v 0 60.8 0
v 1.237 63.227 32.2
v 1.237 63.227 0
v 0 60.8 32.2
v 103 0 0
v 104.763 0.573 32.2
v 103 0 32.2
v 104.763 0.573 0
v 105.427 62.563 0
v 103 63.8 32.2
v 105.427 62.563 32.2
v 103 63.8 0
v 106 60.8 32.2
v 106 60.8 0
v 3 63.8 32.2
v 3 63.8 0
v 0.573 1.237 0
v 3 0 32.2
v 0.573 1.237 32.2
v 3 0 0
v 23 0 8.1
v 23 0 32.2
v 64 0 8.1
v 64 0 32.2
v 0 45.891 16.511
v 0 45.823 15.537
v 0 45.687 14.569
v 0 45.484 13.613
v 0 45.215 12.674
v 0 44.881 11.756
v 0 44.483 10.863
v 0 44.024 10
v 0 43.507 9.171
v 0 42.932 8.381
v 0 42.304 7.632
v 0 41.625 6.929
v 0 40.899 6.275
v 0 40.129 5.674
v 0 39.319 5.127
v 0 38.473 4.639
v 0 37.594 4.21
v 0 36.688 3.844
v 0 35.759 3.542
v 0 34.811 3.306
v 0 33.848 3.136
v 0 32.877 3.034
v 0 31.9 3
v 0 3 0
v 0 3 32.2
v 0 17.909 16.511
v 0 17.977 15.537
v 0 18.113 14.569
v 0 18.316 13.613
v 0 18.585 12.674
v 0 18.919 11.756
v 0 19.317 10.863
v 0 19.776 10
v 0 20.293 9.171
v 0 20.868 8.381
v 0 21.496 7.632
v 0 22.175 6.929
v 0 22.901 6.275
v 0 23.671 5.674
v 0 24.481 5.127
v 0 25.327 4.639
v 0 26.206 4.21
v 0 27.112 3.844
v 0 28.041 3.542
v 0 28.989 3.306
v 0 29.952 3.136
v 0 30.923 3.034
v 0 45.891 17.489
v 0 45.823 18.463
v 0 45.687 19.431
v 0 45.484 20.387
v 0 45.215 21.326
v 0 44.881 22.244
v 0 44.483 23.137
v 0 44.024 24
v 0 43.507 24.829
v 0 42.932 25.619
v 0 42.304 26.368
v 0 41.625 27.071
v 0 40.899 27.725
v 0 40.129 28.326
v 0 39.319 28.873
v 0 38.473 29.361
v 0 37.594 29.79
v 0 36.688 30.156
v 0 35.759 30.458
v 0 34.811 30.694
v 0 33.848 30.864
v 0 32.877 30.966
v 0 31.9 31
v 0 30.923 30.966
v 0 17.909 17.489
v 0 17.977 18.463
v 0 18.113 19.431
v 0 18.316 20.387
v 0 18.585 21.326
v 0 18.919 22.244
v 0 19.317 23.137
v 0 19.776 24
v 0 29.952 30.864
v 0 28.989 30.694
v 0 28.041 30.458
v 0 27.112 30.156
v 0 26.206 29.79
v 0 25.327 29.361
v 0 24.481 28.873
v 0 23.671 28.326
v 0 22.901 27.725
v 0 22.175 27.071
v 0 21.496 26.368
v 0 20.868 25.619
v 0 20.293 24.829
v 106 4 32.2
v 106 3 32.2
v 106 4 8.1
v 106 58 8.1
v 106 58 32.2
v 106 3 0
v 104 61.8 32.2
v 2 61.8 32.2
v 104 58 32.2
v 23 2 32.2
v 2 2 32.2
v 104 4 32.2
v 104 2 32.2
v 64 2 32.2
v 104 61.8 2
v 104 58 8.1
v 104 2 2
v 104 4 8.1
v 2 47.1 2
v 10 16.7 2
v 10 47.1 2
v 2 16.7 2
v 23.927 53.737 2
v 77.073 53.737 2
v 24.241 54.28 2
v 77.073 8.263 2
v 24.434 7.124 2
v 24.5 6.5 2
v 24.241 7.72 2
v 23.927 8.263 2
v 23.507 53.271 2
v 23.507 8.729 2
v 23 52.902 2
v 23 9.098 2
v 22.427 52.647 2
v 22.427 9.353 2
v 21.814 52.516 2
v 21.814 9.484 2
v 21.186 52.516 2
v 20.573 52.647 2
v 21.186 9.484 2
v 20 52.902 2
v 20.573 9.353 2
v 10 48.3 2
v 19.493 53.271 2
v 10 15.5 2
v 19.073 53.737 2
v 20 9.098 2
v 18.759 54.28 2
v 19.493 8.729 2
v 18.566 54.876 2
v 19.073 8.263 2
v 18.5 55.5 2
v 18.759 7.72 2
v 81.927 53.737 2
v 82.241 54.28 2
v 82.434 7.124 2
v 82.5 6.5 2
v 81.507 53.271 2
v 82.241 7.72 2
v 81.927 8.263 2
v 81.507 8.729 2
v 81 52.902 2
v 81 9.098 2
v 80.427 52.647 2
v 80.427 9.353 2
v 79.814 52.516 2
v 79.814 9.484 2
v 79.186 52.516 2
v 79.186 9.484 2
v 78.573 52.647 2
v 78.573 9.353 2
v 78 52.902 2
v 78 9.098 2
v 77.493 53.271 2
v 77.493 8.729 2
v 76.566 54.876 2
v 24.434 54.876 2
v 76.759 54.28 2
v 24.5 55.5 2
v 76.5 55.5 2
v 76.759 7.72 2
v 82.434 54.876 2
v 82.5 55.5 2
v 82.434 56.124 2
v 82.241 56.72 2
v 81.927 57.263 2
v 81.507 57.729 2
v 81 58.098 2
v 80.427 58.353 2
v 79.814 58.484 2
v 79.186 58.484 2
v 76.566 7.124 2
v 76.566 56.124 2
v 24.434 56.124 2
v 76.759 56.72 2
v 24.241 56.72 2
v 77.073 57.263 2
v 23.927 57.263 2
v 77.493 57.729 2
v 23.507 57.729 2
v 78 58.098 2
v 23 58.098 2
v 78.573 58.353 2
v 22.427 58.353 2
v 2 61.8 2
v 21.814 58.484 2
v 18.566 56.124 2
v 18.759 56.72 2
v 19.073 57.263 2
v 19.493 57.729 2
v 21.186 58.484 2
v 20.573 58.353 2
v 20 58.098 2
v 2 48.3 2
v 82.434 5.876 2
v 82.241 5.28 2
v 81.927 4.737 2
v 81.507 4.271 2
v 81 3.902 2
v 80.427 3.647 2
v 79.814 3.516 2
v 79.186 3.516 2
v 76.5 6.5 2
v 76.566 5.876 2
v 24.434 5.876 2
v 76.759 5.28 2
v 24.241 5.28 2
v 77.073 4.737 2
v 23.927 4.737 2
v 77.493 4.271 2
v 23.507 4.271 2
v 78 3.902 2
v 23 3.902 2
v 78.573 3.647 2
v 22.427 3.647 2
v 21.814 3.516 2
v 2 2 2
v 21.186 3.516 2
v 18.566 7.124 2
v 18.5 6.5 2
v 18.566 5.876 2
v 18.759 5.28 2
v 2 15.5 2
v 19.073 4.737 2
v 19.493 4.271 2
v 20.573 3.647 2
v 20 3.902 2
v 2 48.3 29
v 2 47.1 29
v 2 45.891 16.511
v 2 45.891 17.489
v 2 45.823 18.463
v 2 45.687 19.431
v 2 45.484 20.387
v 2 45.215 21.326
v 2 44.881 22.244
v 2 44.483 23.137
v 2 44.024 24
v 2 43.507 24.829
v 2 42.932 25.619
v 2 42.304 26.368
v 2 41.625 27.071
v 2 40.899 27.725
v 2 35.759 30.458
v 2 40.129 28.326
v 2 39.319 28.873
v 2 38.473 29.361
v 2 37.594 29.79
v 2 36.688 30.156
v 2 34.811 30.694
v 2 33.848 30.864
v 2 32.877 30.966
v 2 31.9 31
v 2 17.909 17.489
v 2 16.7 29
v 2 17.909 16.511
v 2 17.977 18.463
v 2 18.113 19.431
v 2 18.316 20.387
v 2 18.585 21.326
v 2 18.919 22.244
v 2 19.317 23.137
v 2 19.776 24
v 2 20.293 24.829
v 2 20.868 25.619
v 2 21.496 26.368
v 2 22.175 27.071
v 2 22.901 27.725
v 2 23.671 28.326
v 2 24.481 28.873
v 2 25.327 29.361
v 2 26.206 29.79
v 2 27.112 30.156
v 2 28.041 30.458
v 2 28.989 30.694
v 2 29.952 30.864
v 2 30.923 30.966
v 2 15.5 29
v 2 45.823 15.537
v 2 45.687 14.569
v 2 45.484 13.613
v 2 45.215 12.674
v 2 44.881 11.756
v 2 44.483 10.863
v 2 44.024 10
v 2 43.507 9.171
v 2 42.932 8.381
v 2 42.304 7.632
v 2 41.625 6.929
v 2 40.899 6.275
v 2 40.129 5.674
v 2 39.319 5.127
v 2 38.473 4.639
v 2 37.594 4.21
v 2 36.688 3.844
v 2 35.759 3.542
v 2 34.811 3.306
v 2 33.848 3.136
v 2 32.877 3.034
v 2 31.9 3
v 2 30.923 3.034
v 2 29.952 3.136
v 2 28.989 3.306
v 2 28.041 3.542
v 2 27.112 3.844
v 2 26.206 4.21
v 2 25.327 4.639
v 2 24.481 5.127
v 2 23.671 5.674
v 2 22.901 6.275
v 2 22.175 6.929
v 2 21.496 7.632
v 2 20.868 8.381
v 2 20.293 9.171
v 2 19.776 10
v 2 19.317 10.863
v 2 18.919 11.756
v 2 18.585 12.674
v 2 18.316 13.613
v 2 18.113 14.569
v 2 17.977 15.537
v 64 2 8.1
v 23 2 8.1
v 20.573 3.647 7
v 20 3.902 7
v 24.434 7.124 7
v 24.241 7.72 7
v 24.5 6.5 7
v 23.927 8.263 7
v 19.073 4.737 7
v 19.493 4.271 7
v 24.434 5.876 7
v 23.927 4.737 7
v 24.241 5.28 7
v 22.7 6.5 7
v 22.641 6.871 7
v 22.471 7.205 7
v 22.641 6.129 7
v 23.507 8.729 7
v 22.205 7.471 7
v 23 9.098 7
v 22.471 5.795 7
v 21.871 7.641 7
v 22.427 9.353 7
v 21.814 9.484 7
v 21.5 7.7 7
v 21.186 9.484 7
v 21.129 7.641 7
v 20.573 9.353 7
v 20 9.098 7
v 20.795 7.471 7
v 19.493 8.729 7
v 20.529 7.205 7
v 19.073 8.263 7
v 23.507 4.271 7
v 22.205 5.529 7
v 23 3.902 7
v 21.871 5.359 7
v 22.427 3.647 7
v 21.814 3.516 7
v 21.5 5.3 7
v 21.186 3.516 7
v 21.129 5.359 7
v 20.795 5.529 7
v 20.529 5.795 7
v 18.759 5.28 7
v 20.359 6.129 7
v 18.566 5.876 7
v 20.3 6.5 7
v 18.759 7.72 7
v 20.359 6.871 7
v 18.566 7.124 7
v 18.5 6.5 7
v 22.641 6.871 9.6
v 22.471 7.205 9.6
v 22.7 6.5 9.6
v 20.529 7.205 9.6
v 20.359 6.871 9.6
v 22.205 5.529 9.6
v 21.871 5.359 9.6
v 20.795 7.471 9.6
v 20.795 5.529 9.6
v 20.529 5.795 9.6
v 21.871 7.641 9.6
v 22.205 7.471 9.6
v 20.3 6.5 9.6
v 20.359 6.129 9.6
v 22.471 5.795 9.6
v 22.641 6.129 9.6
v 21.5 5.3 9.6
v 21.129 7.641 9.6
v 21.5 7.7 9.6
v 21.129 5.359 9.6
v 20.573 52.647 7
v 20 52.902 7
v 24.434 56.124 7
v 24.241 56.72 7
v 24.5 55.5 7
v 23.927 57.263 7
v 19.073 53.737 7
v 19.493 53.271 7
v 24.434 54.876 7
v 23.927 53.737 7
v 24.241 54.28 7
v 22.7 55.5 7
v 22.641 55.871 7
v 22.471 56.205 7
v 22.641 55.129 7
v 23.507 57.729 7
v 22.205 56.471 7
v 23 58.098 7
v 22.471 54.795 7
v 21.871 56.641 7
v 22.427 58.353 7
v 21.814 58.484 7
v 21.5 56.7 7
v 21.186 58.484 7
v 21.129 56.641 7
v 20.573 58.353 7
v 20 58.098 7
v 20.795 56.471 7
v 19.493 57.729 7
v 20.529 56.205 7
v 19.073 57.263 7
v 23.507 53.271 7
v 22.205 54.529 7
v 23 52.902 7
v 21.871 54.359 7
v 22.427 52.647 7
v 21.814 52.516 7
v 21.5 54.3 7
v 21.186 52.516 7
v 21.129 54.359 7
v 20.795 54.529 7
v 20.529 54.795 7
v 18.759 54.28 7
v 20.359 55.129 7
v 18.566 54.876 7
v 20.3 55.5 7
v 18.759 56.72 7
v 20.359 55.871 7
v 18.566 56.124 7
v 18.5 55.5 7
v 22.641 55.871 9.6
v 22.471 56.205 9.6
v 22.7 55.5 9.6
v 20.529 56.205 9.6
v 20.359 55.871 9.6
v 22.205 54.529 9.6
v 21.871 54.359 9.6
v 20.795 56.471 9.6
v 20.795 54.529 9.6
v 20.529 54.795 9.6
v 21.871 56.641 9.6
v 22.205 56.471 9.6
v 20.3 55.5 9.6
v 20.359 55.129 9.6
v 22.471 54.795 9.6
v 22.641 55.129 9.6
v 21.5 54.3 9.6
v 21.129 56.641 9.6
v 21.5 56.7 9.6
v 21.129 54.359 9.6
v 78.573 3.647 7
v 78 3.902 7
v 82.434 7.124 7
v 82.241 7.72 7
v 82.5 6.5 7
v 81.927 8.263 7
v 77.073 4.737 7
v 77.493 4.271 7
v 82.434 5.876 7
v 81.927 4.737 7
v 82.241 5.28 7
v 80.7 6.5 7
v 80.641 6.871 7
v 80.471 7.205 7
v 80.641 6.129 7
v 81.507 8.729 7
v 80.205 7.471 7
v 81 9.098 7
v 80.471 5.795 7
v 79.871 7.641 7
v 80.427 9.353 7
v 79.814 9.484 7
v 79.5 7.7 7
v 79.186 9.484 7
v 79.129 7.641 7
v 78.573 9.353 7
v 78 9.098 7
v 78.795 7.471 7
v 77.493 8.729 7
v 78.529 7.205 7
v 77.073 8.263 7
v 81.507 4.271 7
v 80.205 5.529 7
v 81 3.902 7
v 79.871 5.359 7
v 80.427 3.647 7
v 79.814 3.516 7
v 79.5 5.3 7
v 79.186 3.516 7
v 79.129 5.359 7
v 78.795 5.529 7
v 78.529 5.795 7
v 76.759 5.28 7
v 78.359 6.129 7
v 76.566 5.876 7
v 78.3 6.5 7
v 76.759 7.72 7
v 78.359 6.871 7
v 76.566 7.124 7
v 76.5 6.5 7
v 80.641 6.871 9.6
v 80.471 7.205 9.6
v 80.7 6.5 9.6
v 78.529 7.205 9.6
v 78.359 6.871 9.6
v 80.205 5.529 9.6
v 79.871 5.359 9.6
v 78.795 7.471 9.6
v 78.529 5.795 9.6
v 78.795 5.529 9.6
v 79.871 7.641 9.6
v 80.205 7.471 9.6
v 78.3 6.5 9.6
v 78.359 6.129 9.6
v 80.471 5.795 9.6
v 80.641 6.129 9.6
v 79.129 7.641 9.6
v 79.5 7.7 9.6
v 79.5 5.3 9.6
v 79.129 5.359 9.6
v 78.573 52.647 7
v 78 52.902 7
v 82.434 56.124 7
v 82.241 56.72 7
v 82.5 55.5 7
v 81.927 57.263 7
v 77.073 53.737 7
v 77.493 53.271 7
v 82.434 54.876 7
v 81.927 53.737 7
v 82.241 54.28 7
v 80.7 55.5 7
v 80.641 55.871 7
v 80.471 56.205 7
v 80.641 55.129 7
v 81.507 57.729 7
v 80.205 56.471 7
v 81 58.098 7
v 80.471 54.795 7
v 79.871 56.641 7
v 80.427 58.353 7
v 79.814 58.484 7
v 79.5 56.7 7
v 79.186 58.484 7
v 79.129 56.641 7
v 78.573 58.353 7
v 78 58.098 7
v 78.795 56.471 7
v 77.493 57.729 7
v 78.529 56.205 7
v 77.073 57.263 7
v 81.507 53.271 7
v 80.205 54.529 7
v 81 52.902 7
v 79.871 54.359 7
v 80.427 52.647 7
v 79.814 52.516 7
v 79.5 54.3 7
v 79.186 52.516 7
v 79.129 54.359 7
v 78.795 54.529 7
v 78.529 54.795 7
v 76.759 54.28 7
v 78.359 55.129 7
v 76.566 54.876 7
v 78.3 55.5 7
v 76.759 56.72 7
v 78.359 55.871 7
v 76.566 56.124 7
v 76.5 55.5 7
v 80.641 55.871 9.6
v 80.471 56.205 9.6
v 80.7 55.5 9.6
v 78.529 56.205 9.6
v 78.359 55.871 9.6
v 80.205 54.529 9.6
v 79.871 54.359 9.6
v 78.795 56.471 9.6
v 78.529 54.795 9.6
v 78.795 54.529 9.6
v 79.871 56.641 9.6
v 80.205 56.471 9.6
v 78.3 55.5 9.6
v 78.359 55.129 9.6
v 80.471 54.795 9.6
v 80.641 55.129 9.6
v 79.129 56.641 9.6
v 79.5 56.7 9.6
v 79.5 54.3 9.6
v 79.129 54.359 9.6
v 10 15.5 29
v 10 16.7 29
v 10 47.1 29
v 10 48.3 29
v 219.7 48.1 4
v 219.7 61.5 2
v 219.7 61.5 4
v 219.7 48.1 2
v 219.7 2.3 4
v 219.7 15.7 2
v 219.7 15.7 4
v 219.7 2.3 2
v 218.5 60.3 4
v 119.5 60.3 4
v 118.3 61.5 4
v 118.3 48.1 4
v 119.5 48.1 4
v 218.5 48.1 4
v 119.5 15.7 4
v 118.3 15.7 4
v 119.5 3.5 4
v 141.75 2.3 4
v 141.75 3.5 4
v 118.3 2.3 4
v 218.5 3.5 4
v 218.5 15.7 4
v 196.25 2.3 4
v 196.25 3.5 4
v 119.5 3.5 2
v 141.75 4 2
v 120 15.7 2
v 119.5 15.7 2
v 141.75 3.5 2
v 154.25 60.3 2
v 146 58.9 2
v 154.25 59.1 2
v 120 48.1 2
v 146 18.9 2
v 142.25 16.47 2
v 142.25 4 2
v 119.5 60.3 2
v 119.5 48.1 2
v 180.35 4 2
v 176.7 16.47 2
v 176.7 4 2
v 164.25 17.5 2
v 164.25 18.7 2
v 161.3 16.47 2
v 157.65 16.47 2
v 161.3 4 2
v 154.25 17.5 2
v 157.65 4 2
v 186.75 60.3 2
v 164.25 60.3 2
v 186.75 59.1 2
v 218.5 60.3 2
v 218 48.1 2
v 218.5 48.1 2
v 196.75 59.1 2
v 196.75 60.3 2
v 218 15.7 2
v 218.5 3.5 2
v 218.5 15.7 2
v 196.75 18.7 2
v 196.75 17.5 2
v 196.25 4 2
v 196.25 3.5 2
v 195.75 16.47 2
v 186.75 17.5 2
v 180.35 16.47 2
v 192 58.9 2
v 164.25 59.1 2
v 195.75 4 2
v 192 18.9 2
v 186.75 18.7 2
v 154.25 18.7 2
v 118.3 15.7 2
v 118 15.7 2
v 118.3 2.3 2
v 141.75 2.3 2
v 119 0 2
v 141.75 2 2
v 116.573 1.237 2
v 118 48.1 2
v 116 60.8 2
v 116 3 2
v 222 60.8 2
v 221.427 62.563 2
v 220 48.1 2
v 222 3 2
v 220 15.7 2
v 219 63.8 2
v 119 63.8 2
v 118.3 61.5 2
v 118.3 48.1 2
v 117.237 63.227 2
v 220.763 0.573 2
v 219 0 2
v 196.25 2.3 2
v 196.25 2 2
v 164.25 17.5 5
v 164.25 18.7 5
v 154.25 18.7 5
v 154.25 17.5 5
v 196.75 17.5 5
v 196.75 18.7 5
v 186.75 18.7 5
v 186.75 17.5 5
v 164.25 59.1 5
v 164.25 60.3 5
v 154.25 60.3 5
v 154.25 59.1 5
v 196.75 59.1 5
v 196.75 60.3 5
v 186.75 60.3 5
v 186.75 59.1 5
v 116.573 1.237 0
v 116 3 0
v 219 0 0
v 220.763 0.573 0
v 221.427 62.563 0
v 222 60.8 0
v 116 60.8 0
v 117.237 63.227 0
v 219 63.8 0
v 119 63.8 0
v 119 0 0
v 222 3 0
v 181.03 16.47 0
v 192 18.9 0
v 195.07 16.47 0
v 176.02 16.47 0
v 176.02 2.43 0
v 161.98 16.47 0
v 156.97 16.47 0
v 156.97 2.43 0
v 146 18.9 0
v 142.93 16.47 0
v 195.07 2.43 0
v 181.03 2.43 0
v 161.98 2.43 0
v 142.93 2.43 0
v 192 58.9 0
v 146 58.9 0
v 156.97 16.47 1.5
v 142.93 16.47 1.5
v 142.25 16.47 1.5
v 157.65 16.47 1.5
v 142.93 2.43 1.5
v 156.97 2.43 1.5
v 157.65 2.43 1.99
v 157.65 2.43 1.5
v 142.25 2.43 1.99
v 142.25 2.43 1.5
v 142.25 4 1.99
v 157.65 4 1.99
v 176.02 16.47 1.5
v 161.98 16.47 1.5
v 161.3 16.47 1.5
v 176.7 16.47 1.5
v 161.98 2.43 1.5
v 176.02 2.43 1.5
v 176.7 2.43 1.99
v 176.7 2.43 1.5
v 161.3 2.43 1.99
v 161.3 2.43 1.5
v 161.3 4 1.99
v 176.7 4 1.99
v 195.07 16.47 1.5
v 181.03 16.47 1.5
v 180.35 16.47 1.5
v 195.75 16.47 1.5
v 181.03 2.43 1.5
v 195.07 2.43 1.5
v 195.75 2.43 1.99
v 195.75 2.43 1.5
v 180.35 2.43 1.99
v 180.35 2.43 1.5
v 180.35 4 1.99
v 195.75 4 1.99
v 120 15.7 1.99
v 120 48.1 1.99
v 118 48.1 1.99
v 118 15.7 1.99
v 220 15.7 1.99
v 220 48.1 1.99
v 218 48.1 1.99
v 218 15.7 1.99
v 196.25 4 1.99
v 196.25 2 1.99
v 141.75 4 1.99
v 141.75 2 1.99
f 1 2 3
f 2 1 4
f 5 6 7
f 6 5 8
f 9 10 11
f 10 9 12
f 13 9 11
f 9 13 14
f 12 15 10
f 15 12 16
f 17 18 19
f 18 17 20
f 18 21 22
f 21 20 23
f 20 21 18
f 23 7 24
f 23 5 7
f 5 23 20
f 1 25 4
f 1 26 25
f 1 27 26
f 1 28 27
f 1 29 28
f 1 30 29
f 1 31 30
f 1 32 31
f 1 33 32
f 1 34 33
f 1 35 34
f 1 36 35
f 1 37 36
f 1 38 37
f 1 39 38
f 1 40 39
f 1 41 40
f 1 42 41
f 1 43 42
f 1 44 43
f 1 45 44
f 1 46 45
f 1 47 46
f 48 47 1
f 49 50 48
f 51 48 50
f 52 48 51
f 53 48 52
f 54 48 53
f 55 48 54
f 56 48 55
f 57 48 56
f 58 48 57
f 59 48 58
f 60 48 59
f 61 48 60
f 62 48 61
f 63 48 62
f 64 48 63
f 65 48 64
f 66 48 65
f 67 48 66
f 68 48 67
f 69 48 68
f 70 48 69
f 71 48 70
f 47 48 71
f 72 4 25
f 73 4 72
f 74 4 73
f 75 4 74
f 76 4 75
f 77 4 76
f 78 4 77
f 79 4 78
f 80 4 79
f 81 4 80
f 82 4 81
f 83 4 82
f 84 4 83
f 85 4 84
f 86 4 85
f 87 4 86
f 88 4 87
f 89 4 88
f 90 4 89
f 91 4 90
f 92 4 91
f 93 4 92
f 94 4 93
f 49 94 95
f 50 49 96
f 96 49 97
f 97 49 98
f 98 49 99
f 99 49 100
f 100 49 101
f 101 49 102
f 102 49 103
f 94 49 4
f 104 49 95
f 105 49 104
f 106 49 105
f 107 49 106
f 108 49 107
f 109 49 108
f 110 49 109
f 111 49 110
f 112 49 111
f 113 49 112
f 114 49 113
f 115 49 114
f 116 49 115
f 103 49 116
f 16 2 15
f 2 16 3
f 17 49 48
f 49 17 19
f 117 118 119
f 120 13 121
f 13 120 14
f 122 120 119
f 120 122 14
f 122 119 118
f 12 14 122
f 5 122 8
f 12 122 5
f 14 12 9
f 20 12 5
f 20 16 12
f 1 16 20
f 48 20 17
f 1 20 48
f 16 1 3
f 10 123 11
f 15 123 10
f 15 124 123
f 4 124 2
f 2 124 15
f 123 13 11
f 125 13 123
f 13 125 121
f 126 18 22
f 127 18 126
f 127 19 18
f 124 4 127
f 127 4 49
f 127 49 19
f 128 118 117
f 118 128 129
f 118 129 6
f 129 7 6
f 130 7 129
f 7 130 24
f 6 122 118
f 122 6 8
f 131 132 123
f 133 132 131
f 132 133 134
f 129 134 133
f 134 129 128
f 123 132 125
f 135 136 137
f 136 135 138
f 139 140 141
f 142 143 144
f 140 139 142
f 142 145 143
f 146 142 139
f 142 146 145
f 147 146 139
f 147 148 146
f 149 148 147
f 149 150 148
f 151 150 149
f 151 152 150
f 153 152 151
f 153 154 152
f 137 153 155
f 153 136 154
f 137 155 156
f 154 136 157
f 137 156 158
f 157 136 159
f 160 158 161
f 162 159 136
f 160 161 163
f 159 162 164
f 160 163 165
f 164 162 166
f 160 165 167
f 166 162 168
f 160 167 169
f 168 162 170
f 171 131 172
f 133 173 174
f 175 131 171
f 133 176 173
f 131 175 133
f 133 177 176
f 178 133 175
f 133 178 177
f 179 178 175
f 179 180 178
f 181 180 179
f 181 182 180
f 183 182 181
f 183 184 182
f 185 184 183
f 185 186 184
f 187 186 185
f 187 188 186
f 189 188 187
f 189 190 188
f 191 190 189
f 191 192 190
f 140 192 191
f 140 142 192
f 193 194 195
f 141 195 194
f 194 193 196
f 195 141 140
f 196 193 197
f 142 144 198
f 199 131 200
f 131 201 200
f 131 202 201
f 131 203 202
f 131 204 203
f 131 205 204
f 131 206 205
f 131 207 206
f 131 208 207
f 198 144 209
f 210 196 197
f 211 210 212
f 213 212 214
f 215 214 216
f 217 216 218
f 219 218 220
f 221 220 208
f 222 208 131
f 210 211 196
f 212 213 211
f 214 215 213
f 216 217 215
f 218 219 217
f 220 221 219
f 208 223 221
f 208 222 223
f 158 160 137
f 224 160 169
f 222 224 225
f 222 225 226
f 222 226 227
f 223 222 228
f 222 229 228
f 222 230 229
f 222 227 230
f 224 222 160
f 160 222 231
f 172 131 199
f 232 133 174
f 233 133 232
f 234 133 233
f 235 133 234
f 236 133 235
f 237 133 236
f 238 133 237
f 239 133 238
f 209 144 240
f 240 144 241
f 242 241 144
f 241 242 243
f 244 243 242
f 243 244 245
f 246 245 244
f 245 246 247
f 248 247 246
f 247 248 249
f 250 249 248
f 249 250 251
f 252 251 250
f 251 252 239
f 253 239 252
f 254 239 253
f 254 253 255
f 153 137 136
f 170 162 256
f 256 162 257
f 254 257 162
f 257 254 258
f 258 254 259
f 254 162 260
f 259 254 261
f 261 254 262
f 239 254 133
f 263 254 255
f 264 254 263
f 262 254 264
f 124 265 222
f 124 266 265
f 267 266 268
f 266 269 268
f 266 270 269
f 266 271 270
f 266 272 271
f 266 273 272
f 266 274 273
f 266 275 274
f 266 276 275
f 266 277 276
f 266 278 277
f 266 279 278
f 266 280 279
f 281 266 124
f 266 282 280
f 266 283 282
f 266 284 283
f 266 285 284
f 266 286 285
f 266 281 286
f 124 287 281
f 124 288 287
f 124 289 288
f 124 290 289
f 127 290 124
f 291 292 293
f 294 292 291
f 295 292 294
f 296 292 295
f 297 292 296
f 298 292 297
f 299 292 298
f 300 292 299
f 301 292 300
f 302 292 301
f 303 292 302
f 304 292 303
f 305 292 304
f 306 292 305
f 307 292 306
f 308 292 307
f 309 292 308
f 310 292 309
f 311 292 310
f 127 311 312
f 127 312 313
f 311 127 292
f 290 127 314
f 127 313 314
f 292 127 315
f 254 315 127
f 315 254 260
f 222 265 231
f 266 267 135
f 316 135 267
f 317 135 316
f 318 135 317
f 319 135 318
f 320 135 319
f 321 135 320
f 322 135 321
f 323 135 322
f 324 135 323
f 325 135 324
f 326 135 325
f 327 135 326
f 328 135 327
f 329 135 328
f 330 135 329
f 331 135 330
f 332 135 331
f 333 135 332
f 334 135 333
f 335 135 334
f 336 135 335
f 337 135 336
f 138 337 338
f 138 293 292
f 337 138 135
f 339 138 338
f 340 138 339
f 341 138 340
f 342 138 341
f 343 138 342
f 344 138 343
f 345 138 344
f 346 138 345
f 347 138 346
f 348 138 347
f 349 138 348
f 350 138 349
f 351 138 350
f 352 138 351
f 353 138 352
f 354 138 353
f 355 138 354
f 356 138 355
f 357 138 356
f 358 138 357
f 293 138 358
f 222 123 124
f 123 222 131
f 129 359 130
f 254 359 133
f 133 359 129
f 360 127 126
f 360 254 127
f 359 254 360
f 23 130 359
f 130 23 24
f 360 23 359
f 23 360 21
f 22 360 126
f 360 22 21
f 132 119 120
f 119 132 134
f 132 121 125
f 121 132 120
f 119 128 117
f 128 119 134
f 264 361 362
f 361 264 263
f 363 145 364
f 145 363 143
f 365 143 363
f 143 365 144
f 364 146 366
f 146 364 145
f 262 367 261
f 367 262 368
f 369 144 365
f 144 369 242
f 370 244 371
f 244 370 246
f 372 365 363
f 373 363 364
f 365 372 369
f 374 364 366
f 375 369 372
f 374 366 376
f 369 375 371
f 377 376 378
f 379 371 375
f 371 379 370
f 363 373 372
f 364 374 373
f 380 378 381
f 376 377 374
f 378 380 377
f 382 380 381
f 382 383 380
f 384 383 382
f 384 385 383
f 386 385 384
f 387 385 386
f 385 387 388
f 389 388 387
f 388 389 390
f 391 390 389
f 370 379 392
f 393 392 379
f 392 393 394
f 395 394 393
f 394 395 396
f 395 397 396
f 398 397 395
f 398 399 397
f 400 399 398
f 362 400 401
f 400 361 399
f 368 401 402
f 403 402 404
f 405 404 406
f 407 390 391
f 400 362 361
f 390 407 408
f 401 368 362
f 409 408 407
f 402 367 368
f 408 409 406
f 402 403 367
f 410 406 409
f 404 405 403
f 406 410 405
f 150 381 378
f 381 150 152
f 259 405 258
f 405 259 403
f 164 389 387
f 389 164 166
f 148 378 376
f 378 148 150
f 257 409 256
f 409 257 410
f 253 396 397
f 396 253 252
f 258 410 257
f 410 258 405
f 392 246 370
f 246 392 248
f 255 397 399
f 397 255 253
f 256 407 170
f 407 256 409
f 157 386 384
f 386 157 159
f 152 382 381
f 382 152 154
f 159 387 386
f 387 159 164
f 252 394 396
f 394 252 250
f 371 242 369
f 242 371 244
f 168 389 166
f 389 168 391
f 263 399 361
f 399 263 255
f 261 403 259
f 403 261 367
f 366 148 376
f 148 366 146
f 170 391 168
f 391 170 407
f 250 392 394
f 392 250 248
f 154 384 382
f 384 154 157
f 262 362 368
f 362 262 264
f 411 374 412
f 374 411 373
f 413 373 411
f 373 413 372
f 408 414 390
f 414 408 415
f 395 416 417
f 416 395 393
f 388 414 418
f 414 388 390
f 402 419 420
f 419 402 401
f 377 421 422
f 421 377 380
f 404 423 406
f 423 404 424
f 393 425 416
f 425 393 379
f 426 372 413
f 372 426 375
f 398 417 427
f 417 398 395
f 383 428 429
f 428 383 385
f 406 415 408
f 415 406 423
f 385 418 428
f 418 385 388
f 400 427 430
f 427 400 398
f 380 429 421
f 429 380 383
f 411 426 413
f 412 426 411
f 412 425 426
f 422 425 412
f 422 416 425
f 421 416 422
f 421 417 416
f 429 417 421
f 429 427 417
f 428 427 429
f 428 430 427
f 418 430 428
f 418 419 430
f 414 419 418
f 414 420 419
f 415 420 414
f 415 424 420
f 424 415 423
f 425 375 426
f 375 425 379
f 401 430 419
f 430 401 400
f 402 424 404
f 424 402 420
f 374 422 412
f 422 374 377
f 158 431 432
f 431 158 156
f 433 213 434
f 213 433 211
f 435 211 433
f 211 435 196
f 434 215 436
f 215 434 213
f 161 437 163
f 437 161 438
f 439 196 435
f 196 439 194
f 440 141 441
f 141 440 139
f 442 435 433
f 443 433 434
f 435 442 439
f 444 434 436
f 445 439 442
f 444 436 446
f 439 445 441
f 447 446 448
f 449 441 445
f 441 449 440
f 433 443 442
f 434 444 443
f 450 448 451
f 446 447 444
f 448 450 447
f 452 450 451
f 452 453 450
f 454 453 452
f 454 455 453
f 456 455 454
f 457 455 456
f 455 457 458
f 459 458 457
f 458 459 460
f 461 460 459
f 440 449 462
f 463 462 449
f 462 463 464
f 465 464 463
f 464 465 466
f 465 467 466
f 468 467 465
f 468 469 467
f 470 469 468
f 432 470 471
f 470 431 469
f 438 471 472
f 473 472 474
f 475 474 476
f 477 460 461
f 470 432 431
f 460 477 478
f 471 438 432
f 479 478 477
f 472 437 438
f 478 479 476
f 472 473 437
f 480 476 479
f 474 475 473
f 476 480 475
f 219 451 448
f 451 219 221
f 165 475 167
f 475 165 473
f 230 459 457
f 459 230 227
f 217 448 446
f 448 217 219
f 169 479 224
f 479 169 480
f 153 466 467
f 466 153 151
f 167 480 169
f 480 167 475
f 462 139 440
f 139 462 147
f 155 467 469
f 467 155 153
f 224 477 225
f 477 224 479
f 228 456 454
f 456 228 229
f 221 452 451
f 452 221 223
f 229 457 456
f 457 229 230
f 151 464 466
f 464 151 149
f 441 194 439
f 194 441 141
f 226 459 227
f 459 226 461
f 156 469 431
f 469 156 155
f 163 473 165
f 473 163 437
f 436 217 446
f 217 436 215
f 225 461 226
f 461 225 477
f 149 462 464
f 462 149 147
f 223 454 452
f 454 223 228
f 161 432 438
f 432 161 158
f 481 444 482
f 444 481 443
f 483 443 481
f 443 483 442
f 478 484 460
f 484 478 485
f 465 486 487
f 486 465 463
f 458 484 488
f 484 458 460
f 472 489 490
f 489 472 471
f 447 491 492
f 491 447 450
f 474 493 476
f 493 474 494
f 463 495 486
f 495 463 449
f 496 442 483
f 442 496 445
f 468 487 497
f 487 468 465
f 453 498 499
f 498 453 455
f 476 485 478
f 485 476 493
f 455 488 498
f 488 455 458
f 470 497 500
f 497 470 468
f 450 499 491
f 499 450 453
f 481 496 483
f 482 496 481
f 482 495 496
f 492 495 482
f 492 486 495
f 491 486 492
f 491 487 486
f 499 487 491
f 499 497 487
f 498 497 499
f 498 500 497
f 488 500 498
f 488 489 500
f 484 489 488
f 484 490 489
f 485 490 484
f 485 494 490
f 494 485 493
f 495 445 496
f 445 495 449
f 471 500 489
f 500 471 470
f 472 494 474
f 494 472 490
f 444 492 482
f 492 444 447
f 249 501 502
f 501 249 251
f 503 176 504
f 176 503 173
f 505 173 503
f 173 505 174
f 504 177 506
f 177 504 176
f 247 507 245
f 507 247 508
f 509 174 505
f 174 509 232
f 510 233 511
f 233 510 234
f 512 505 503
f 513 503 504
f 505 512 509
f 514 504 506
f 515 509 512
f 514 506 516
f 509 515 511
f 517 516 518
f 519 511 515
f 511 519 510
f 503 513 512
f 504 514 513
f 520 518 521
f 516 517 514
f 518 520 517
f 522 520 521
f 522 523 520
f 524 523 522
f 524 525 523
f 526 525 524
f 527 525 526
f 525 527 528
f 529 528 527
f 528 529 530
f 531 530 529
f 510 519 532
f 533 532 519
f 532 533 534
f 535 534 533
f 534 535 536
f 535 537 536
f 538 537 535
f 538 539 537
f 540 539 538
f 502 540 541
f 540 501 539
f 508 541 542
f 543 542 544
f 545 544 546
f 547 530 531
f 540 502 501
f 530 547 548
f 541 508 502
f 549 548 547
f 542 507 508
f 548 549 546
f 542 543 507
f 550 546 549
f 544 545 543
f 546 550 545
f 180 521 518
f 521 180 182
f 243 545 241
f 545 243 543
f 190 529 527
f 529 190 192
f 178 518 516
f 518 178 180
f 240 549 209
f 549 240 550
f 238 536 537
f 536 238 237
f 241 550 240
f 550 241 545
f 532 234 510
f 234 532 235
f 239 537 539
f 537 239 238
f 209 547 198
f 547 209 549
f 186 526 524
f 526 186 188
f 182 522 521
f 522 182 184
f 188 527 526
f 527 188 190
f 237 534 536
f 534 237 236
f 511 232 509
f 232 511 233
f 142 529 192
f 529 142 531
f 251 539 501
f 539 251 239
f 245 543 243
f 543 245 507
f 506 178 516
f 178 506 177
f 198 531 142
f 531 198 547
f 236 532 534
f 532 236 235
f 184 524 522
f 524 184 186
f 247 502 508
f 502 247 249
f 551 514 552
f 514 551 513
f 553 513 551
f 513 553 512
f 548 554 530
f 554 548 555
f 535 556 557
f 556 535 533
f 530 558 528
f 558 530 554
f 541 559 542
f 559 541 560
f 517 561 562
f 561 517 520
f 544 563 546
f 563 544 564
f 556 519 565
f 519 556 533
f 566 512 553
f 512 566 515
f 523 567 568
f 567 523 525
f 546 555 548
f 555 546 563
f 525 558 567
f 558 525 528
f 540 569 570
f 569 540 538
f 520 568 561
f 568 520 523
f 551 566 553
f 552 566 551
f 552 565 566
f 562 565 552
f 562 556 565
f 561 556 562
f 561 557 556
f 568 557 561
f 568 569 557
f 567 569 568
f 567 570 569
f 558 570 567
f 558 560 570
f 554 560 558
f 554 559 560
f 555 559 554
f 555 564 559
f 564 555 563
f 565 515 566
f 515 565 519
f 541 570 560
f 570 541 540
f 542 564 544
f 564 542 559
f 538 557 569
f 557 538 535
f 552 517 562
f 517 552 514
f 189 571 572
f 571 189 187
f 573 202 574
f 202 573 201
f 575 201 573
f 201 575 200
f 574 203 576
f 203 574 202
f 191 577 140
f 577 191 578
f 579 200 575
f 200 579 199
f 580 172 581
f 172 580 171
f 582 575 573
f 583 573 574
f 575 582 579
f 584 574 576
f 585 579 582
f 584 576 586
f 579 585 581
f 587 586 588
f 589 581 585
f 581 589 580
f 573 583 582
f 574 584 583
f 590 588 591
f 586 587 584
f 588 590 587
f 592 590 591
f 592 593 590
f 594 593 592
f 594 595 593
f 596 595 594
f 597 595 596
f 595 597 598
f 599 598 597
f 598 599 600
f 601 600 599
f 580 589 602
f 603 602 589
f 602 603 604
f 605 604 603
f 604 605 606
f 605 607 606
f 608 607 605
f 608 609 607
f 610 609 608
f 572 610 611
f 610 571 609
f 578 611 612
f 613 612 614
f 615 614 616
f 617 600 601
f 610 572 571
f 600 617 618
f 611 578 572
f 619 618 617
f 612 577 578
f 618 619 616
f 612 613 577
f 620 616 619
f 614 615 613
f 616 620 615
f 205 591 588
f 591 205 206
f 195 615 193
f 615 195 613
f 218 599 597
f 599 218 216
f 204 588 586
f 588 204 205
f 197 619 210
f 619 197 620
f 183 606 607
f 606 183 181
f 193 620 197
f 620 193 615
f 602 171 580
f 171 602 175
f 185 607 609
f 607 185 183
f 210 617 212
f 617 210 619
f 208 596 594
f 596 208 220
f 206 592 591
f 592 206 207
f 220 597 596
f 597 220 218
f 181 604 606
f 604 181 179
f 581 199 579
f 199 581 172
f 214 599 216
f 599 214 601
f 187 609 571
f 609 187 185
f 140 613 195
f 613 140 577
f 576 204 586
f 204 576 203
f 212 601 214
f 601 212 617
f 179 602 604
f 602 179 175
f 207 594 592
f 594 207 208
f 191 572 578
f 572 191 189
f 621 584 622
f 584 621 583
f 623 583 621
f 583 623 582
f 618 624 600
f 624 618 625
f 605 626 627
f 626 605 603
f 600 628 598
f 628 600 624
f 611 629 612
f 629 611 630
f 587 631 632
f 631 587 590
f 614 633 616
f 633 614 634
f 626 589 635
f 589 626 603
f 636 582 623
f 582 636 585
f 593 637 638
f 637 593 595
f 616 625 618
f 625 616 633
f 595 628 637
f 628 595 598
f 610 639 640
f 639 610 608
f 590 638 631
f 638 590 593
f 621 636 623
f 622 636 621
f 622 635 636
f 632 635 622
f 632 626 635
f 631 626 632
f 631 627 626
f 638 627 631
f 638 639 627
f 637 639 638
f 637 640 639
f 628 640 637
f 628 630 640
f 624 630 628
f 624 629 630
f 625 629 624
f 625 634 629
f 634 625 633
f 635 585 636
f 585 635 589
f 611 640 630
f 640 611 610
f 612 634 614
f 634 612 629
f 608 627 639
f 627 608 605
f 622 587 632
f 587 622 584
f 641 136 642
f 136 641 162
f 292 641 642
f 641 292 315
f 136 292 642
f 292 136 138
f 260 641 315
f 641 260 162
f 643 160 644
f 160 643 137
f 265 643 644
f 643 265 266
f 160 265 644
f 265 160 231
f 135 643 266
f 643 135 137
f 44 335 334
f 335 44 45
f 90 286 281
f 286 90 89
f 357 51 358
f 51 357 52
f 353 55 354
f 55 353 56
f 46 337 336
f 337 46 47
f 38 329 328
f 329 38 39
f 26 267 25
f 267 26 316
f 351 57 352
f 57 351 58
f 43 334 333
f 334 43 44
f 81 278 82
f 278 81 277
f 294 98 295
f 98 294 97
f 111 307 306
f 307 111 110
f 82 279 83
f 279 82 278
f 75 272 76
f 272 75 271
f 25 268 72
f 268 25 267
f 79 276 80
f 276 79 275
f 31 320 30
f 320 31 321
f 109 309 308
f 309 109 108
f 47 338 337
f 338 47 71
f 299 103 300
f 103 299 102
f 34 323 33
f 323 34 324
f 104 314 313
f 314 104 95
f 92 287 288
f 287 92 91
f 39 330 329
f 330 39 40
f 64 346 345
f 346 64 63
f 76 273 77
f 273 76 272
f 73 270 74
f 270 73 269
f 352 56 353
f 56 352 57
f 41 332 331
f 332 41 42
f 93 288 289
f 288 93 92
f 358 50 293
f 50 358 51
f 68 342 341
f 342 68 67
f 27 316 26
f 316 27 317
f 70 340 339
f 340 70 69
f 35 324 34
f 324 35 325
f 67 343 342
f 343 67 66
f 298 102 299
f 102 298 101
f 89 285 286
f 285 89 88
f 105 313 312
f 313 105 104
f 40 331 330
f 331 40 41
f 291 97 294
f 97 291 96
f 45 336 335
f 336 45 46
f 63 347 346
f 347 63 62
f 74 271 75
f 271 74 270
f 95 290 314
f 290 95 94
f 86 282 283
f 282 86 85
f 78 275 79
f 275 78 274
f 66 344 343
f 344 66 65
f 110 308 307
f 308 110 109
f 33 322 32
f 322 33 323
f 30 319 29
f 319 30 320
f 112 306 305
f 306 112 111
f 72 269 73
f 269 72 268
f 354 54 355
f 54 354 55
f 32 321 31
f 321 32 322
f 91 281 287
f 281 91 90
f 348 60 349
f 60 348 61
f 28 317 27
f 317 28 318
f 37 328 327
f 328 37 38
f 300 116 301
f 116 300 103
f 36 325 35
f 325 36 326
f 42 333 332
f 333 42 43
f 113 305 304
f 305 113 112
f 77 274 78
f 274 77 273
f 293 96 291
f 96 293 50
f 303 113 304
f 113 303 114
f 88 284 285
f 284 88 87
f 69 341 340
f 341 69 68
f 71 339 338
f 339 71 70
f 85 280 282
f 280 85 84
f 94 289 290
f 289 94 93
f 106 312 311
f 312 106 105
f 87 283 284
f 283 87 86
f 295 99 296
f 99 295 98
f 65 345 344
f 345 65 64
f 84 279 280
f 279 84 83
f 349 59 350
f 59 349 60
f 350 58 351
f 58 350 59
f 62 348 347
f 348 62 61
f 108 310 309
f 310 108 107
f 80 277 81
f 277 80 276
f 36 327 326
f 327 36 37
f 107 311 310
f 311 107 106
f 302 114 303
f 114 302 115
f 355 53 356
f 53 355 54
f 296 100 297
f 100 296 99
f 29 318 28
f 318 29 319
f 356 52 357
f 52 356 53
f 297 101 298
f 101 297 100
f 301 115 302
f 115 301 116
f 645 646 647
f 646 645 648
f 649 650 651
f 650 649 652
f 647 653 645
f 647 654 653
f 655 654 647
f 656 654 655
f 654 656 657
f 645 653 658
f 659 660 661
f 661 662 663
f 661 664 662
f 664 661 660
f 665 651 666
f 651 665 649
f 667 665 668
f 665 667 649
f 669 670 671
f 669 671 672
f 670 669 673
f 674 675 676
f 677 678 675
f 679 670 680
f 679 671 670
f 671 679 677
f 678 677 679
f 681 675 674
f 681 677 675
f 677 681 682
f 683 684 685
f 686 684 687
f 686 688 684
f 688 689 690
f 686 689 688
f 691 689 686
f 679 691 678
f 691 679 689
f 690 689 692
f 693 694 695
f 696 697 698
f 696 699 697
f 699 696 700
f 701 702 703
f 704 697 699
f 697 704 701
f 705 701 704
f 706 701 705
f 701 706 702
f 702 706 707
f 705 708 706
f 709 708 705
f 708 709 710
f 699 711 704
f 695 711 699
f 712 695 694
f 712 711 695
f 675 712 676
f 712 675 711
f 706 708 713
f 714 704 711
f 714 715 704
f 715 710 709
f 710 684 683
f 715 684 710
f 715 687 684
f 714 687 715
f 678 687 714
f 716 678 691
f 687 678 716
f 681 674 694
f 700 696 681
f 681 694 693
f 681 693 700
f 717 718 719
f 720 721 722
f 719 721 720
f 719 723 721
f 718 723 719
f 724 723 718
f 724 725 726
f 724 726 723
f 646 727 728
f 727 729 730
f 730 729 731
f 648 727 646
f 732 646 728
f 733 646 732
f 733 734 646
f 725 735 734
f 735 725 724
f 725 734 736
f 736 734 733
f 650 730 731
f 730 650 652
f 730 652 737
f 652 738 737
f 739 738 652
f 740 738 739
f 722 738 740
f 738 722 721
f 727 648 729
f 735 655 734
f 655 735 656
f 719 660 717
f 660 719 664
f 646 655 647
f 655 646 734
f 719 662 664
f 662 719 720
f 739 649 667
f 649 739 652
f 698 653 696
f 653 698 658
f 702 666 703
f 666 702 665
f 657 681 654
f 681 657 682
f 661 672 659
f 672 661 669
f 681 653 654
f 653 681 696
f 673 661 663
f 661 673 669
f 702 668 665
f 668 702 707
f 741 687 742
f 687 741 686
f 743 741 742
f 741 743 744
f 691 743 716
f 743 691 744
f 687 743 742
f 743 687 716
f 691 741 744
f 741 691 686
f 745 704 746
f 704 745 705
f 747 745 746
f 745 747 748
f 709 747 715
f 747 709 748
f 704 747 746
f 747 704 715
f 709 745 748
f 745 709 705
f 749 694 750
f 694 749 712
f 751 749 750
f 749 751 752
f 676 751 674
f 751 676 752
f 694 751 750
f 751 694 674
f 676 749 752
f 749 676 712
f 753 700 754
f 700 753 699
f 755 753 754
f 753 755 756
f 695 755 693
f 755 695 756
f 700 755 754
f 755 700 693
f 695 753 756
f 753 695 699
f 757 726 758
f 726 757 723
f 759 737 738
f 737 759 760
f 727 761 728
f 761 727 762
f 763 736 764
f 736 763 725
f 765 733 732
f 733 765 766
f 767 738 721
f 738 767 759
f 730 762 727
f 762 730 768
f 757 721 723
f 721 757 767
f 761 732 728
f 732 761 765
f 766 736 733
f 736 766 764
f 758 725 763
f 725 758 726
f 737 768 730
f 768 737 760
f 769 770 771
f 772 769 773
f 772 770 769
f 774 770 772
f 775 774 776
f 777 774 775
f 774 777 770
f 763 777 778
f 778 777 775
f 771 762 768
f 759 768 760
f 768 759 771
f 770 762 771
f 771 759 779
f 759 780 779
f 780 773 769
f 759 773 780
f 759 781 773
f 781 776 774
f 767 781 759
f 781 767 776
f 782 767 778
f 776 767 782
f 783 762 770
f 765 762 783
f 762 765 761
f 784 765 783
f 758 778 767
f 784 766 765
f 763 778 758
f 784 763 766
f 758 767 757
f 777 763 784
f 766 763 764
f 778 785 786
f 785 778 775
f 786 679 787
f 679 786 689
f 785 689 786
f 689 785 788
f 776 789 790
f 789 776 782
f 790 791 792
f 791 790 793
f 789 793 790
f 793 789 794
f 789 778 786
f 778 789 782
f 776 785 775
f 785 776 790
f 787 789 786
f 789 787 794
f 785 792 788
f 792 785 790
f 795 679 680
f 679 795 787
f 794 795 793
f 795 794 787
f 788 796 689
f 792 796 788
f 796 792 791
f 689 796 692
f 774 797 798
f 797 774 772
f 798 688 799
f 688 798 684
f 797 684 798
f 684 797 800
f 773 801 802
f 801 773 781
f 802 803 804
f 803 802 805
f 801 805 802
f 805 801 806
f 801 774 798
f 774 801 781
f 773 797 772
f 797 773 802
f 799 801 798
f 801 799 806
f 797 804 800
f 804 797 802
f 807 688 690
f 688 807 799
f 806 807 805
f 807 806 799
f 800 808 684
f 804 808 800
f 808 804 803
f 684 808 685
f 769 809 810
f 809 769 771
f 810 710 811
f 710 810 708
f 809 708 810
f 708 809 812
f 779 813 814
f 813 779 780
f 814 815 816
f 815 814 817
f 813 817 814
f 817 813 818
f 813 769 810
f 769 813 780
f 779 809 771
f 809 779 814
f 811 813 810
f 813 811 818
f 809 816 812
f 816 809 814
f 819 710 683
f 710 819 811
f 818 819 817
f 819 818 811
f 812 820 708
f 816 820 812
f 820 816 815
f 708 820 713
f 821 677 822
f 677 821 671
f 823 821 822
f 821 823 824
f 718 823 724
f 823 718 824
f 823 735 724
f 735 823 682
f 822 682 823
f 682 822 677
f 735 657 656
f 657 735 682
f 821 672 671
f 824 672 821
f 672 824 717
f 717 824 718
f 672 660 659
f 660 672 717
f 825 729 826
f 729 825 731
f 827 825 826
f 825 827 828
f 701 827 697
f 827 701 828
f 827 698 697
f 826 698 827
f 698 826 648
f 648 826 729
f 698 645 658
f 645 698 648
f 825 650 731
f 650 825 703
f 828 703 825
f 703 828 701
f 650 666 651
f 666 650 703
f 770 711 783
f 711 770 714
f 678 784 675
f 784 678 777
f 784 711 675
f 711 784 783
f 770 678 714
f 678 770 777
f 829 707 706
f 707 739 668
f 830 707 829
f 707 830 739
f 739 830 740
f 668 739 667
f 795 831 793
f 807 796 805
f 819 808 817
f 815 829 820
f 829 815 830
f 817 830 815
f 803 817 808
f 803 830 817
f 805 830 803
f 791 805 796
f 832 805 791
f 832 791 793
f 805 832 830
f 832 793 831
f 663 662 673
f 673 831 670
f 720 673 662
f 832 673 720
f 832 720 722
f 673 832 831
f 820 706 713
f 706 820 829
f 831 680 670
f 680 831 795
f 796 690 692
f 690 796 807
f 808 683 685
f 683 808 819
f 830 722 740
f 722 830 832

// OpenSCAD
// Raspberry Pi 5 case v2: base + lid.
//   Base : same as pi_case.scad, but the -x end-wall camera opening is enlarged into a
//          28 mm fan opening, and the 30x30x7 fan sits INSIDE the case against that wall
//          (nothing sticks out of the case), held by two side ribs on the floor.
//   Lid  : same as pi_case.scad (same screen window), short-side screen walls removed,
//          4 round buttons replaced by 3 Cherry MX cutouts.
// Export: openscad -D 'part="base"' -o base.stl pi_case_v2.scad   (same for "lid")
// Print : base upright (floor on bed). Lid plate/face DOWN on bed, as in v1.
// Assemble: flip the lid END-OVER-END (about the Y axis) so the switch row lands on the
//           HDMI / USB-C (-y) side. Everything that mates is symmetric, so either flip fits.
// All units mm. Values marked (ASSUMED) were not specified - see the bottom of the file.

part = "both";      // "base", "lid", "testbed", "both" (print layout), "assembled" (preview), "none"

// ---------- Raspberry Pi 5 (unchanged from v1) ----------
pi_l = 85;  pi_w = 56;  pi_t = 1.6;
pi_hole_dx = 58;  pi_hole_dy = 49;  pi_hole_off = 3.5;   // M2.5 holes
usb_h = 17;         // USB/Ethernet stack height above the PCB (assumed in v1)

// ---------- case (unchanged from v1: proven tolerances) ----------
wall = 2;  floor_t = 2;  plate_t = 2;   // plate_t = lid top thickness
clr = 1;            // gap between Pi and inside wall
fit = 0.3;          // lid lip clearance
lip_t = 1.2;        // lip / pocket wall thickness
ring_h = 2;         // height of the lip that drops into the base
standoff_h = 5;
margin = lip_t + fit;

// ---------- screen (unchanged from v1) ----------
scr_l = 65;  scr_w = 40;   // PCB
scr_t = 5;                 // PCB + glass thickness (v1 assumption)
win_l = 46;  win_w = 40;   // visible window (kept exactly)
win_edge = 3;              // window offset from the glass-end PCB edge (kept exactly)
// Screen locators: small tabs on the two LONG sides only (the screen is taped in, so they
// just stop it sliding). v1 had full-length 5.6 mm walls; these are small and low.
tab_len = 10;              // along the screen's long edge
tab_h = 3;                 // hang below the plate (screen is 5 mm thick, so it still locates it)
tab_n = 2;                 // per long side, placed symmetrically about the board centre
tab_gap = 0.2;             // clearance to the board edge (same 0.4 total as v1's pocket)
tab_x = scr_l/4;           // tabs at +-this from the board centre along x

// ---------- camera (v1 geometry; kept so the base layout is identical) ----------
cam_l = 25;  cam_w = 24;
cam_hole_d = 14;    // v1 lens opening (replaced by the fan opening below)
cam_lens_dy = 2.5;
cam_depth = 8;
cam_wall = 1.2;
cam_cradle_on = false;     // v2: cradle removed - it would sit 8 mm behind the fan and block it

// ---------- fan (ASSUMED: 30 x 30 x 7 mm, e.g. 3007 5 V) ----------
fan_s = 30;                // frame size (height and width)
fan_t = 7;                 // frame thickness = depth into the case from the inner wall face
fan_hole_d = 28;           // airflow opening through the wall (blade sweep ~27-28); a 29 mm
                           // hole would leave only 0.7 mm of wall above it
fan_clr = 0.2;             // clearance per side between fan frame and the ribs
rib_t = 1.2;               // side rib thickness
rib_top = 29;              // ribs stop here (z), below the lid lip (z 30.2) so they never touch it
cable_z = rib_top;         // fan lead runs over the +y rib top, in the 3 mm under the lid

// ---------- switches (Cherry MX) ----------
mx_cut = 14.04;            // measured from modular-key-v1.stl (nominal 14.00), axis-aligned
mx_n = 3;
mx_pitch = 19.05;          // 1u keycap spacing
mx_plate_t = 1.5;          // plate thickness the MX clips need
mx_relief = 15.4;          // underside relief pocket along the clip axis (clip span ~15.2 mm)
mx_rot = 90;               // switch turned 90 deg: plate clips face +-x (along the row), so
                           // nothing sticks out toward the base wall or the screen in y.
                           // The 14 mm square cutout itself is the same either way.
mx_below = 8.3;            // housing (5.0) + pins (3.3) below the plate top face
mx_body = 14.0;            // housing width below the plate
keycap = 18;               // 1u keycap footprint (for the clearance report)
btn_row = 14;              // v1 strip below the screen that holds the switch row

// ---------- derived layout (identical to v1) ----------
pocket_l = scr_l + 0.4 + 2*lip_t;
pocket_w = scr_w + 0.4 + 2*lip_t;
cam_out_l = cam_l + 0.4 + 2*cam_wall;
cam_out_w = cam_w + 0.4 + 2*cam_wall;
cam_len   = cam_depth + 4;
bay_l = cam_len + 3;

px = bay_l + clr;
py = clr;
L = max(px + pi_l + clr, 2*margin + pocket_l);                  // inner length
W = max(pi_w + 2*clr, 2*margin + pocket_w + btn_row);           // inner width

// Screen orientation as in v1 (glass end toward -x in lid coords). With the lid flipped
// end-over-end the board then sits at x 14..79 in the case, clear of the USB stack.
glass_end = -1;            // -1 = v1 orientation (approved layout), +1 = mirrored
win_sx = glass_end * (scr_l/2 - win_edge - win_l/2); // window offset from the screen-board centre
scr_cx = L/2 - win_sx;                    // v2: board shifted so the WINDOW is centred on the lid
scr_cy = W - margin - pocket_w/2;
// v2 switch row: centred under the window in x; keycaps centred in the band between the
// lid's front edge and the window's lower edge (equal gap on both sides) in y.
mx_cx = L/2;                              // = window centre = lid centre
win_y0 = scr_cy - win_w/2;                // window lower edge (inner coords)
mx_cy = (-wall + win_y0)/2;               // mid-band
keycap_gap = (win_y0 + wall - keycap)/2;  // keycap edge to lid edge = keycap edge to window

cam_cy = W/2;
cam_cz = floor_t + cam_out_w/2;

pcb_top = floor_t + standoff_h + pi_t;
hang   = max(ring_h, scr_t + 0.6);
base_h = pcb_top + usb_h + hang + 1;

Lo = L + 2*wall;  Wo = W + 2*wall;        // outer footprint (base and lid)

// ---------- derived v2 ----------
fan_cy = cam_cy;                          // centred on the end wall
fan_cz = floor_t + fan_s/2;               // fan sits on the floor: z 2..32 (lid plate is at 32.2)
mx_span = (mx_n - 1) * mx_pitch;
lip_notch = mx_span + mx_relief + 1;      // lid lip removed over the switch row (x length)

module rrect(l, w, r, h) {
  translate([r, r, 0]) linear_extrude(h) offset(r = r) square([l - 2*r, w - 2*r]);
}

// ======================= BASE =======================
module base() {
  difference() {
    union() {
      difference() {
        rrect(Lo, Wo, 3, base_h);
        // cavity
        translate([wall, wall, floor_t]) cube([L, W, base_h]);
        // -y wall: USB-C power + 2 micro-HDMI (Pi 5 has no audio jack)
        translate([wall + px + 5, -1, pcb_top - 0.5]) cube([41, wall + 2, base_h]);
        // +x wall: Ethernet + USB
        translate([wall + L - 1, wall + py + 1, pcb_top - 0.5]) cube([wall + 2, pi_w - 2, base_h]);
      }
      // Pi standoffs with locating pins
      for (x = [0, pi_hole_dx], y = [0, pi_hole_dy])
        translate([wall + px + pi_hole_off + x, wall + py + pi_hole_off + y, floor_t]) {
          cylinder(d = 6, h = standoff_h, $fn = 30);
          cylinder(d = 2.4, h = standoff_h + pi_t + 1, $fn = 20);
        }
      if (cam_cradle_on) cam_cradle();
      fan_ribs();
    }
    // -x wall: v1 camera opening enlarged into the fan opening
    fan_cutout();
  }
}

// Opening through the -x end wall. The fan's airflow face sits flush on its inner side.
module fan_cutout() {
  translate([-1, wall + fan_cy, fan_cz])
    rotate([0, 90, 0]) cylinder(d = fan_hole_d, h = wall + 1.01, $fn = 90);
}

// Two ribs on the floor, either side of the fan; the wall is the back stop, the lid is the
// top stop (0.2 mm), the fan drops in from above. Tape or a dab of glue stops it sliding
// forward. Ribs are open at the front, so the fan lead leaves over the +y rib top.
module fan_ribs() {
  for (s = [-1, 1])
    translate([wall - 0.01, wall + fan_cy + s*(fan_s/2 + fan_clr) - (s < 0 ? rib_t : 0), floor_t - 0.01])
      cube([fan_t + 1.01, rib_t, rib_top - floor_t + 0.01]);
}

// v1 camera cradle, kept for reference (off by default)
module cam_cradle() {
  difference() {
    translate([wall, wall + cam_cy - cam_out_l/2, floor_t - 0.1])
      cube([cam_len, cam_out_l, cam_out_w + 0.1]);
    translate([wall - 0.01, wall + cam_cy - (cam_l + 0.4)/2, floor_t + cam_wall])
      cube([cam_len + 1, cam_l + 0.4, cam_out_w]);
  }
  for (sy = [-1, 1], z = [0, cam_w + 0.4 - 4])
    translate([wall + cam_depth - 1.5,
               wall + cam_cy + sy * (cam_l + 0.4)/2 - (sy > 0 ? 4 : 0),
               floor_t + cam_wall + z])
      cube([1.5, 4, 4]);
}

// ======================= LID =======================
// Printed plate-down; it flips over onto the base.
module lid() {
  difference() {
    union() {
      rrect(Lo, Wo, 3, plate_t);
      // lip that drops into the base (notched over the switch row)
      translate([wall + fit, wall + fit, plate_t]) difference() {
        cube([L - 2*fit, W - 2*fit, ring_h]);
        translate([lip_t, lip_t, -1]) cube([L - 2*fit - 2*lip_t, W - 2*fit - 2*lip_t, ring_h + 2]);
      }
      // screen locator tabs: 2 small tabs on each LONG side, hugging the board edge
      for (sy = [-1, 1], sx = [-1, 1])
        translate([wall + scr_cx + sx*tab_x - tab_len/2,
                   wall + scr_cy + (sy > 0 ? scr_w/2 + tab_gap : -(scr_w/2 + tab_gap + lip_t)),
                   plate_t - 0.01])
          cube([tab_len, lip_t, tab_h + 0.01]);
    }
    // screen window (unchanged)
    translate([wall + scr_cx + win_sx - win_l/2, wall + scr_cy - win_w/2, -1])
      cube([win_l, win_w, plate_t + 2]);
    // MX switches in the old button row
    for (i = [0 : mx_n - 1])
      translate([wall + mx_cx + (i - (mx_n - 1)/2) * mx_pitch, wall + mx_cy, 0]) rotate([0, 0, mx_rot]) {
        translate([-mx_cut/2, -mx_cut/2, -1]) cube([mx_cut, mx_cut, plate_t + 2]);
        if (plate_t > mx_plate_t)   // underside relief on the clip faces -> 1.5 mm plate there
          translate([-mx_cut/2, -mx_relief/2, mx_plate_t]) cube([mx_cut, mx_relief, plate_t]);
      }
    // lip notch over the switch row (switch housings would hit the -y lip)
    translate([wall + mx_cx - lip_notch/2, wall, plate_t - 0.01])
      cube([lip_notch, fit + lip_t + 0.5, ring_h + 1]);
    // lip notches at BOTH short ends over the fan (fan top is 0.2 mm under the plate, so the
    // lip would hit it); both ends so either lid flip works. Centred, so mirror-symmetric.
    for (ex = [wall, wall + L - fit - lip_t - 0.5])
      translate([ex, wall + W/2 - (fan_s/2 + fan_clr + 1), plate_t - 0.01])
        cube([fit + lip_t + 0.5, fan_s + 2*fan_clr + 2, ring_h + 1]);
  }
}

// lid in its closed position on the base (flipped end-over-end)
module lid_assembled() {
  translate([Lo, 0, base_h + plate_t]) rotate([0, 180, 0]) lid();
}

// Test bed: an exact full-depth slice of lid() around the screen and the 3 switches
// (same window, screen walls, MX cutouts + relief, plate thickness, lip segments).
// Being full depth, its lip pieces also drop into a base, so it can sit on the case.
tb_x0 = wall + min(scr_cx - pocket_l/2, mx_cx - mx_span/2 - keycap/2) - 2;
tb_x1 = wall + max(scr_cx + pocket_l/2, mx_cx + mx_span/2 + keycap/2) + 2;
module test_bed() {
  translate([-tb_x0, 0, 0]) intersection() {
    lid();
    translate([tb_x0, -1, -1]) cube([tb_x1 - tb_x0, Wo + 2, 50]);
  }
}

if (part == "base") base();
else if (part == "lid") lid();
else if (part == "testbed") test_bed();
else if (part == "assembled") { base(); lid_assembled(); }
else if (part == "both") {
  base();
  translate([Lo + 10, 0, 0]) lid();
}

echo(str("Outer size: ", Lo, " x ", Wo, " x ", base_h + plate_t, " mm (base + lid)"));
echo(str("Base h ", base_h, "  lid h ", plate_t + hang, "  inner ", L, " x ", W));
echo(str("Fan inside: x ", wall, "..", wall + fan_t, "  y ", wall + fan_cy - fan_s/2, "..", wall + fan_cy + fan_s/2, "  z ", fan_cz - fan_s/2, "..", fan_cz + fan_s/2, "  Pi starts x ", wall + px));
echo(str("MX row centre y ", wall + mx_cy, "  x centres ", [for (i = [0:mx_n-1]) wall + mx_cx + (i - (mx_n-1)/2)*mx_pitch]));
echo(str("Window x ", wall + scr_cx + win_sx - win_l/2, "..", wall + scr_cx + win_sx + win_l/2,
         " (centre ", wall + scr_cx + win_sx, ", lid centre ", Lo/2, ")  y ", wall + win_y0, "..", wall + win_y0 + win_w));
echo(str("Keycap row x ", wall + mx_cx - mx_span/2 - keycap/2, "..", wall + mx_cx + mx_span/2 + keycap/2,
         "  y ", wall + mx_cy - keycap/2, "..", wall + mx_cy + keycap/2, "  gap to lid edge / window ", keycap_gap));
echo(str("Screen board x ", wall + scr_cx - scr_l/2, "..", wall + scr_cx + scr_l/2));

// ---------- ASSUMPTIONS (fields left TODO) ----------
// Fan: 30x30x7 mm, INSIDE the case on the floor against the -x wall, held by two ribs +
//   tape/glue. 28 mm wall opening. Its screw holes aren't used. Fan lead runs over a rib.
// Screen: v1 numbers kept (65x40 PCB, 46x40 window, 5 mm thick); glass size unknown.
// Switch layout: 3 in a row at 19.05 mm pitch in v1's button strip, centred on the lid.
// Print: base upright; lid face down.
